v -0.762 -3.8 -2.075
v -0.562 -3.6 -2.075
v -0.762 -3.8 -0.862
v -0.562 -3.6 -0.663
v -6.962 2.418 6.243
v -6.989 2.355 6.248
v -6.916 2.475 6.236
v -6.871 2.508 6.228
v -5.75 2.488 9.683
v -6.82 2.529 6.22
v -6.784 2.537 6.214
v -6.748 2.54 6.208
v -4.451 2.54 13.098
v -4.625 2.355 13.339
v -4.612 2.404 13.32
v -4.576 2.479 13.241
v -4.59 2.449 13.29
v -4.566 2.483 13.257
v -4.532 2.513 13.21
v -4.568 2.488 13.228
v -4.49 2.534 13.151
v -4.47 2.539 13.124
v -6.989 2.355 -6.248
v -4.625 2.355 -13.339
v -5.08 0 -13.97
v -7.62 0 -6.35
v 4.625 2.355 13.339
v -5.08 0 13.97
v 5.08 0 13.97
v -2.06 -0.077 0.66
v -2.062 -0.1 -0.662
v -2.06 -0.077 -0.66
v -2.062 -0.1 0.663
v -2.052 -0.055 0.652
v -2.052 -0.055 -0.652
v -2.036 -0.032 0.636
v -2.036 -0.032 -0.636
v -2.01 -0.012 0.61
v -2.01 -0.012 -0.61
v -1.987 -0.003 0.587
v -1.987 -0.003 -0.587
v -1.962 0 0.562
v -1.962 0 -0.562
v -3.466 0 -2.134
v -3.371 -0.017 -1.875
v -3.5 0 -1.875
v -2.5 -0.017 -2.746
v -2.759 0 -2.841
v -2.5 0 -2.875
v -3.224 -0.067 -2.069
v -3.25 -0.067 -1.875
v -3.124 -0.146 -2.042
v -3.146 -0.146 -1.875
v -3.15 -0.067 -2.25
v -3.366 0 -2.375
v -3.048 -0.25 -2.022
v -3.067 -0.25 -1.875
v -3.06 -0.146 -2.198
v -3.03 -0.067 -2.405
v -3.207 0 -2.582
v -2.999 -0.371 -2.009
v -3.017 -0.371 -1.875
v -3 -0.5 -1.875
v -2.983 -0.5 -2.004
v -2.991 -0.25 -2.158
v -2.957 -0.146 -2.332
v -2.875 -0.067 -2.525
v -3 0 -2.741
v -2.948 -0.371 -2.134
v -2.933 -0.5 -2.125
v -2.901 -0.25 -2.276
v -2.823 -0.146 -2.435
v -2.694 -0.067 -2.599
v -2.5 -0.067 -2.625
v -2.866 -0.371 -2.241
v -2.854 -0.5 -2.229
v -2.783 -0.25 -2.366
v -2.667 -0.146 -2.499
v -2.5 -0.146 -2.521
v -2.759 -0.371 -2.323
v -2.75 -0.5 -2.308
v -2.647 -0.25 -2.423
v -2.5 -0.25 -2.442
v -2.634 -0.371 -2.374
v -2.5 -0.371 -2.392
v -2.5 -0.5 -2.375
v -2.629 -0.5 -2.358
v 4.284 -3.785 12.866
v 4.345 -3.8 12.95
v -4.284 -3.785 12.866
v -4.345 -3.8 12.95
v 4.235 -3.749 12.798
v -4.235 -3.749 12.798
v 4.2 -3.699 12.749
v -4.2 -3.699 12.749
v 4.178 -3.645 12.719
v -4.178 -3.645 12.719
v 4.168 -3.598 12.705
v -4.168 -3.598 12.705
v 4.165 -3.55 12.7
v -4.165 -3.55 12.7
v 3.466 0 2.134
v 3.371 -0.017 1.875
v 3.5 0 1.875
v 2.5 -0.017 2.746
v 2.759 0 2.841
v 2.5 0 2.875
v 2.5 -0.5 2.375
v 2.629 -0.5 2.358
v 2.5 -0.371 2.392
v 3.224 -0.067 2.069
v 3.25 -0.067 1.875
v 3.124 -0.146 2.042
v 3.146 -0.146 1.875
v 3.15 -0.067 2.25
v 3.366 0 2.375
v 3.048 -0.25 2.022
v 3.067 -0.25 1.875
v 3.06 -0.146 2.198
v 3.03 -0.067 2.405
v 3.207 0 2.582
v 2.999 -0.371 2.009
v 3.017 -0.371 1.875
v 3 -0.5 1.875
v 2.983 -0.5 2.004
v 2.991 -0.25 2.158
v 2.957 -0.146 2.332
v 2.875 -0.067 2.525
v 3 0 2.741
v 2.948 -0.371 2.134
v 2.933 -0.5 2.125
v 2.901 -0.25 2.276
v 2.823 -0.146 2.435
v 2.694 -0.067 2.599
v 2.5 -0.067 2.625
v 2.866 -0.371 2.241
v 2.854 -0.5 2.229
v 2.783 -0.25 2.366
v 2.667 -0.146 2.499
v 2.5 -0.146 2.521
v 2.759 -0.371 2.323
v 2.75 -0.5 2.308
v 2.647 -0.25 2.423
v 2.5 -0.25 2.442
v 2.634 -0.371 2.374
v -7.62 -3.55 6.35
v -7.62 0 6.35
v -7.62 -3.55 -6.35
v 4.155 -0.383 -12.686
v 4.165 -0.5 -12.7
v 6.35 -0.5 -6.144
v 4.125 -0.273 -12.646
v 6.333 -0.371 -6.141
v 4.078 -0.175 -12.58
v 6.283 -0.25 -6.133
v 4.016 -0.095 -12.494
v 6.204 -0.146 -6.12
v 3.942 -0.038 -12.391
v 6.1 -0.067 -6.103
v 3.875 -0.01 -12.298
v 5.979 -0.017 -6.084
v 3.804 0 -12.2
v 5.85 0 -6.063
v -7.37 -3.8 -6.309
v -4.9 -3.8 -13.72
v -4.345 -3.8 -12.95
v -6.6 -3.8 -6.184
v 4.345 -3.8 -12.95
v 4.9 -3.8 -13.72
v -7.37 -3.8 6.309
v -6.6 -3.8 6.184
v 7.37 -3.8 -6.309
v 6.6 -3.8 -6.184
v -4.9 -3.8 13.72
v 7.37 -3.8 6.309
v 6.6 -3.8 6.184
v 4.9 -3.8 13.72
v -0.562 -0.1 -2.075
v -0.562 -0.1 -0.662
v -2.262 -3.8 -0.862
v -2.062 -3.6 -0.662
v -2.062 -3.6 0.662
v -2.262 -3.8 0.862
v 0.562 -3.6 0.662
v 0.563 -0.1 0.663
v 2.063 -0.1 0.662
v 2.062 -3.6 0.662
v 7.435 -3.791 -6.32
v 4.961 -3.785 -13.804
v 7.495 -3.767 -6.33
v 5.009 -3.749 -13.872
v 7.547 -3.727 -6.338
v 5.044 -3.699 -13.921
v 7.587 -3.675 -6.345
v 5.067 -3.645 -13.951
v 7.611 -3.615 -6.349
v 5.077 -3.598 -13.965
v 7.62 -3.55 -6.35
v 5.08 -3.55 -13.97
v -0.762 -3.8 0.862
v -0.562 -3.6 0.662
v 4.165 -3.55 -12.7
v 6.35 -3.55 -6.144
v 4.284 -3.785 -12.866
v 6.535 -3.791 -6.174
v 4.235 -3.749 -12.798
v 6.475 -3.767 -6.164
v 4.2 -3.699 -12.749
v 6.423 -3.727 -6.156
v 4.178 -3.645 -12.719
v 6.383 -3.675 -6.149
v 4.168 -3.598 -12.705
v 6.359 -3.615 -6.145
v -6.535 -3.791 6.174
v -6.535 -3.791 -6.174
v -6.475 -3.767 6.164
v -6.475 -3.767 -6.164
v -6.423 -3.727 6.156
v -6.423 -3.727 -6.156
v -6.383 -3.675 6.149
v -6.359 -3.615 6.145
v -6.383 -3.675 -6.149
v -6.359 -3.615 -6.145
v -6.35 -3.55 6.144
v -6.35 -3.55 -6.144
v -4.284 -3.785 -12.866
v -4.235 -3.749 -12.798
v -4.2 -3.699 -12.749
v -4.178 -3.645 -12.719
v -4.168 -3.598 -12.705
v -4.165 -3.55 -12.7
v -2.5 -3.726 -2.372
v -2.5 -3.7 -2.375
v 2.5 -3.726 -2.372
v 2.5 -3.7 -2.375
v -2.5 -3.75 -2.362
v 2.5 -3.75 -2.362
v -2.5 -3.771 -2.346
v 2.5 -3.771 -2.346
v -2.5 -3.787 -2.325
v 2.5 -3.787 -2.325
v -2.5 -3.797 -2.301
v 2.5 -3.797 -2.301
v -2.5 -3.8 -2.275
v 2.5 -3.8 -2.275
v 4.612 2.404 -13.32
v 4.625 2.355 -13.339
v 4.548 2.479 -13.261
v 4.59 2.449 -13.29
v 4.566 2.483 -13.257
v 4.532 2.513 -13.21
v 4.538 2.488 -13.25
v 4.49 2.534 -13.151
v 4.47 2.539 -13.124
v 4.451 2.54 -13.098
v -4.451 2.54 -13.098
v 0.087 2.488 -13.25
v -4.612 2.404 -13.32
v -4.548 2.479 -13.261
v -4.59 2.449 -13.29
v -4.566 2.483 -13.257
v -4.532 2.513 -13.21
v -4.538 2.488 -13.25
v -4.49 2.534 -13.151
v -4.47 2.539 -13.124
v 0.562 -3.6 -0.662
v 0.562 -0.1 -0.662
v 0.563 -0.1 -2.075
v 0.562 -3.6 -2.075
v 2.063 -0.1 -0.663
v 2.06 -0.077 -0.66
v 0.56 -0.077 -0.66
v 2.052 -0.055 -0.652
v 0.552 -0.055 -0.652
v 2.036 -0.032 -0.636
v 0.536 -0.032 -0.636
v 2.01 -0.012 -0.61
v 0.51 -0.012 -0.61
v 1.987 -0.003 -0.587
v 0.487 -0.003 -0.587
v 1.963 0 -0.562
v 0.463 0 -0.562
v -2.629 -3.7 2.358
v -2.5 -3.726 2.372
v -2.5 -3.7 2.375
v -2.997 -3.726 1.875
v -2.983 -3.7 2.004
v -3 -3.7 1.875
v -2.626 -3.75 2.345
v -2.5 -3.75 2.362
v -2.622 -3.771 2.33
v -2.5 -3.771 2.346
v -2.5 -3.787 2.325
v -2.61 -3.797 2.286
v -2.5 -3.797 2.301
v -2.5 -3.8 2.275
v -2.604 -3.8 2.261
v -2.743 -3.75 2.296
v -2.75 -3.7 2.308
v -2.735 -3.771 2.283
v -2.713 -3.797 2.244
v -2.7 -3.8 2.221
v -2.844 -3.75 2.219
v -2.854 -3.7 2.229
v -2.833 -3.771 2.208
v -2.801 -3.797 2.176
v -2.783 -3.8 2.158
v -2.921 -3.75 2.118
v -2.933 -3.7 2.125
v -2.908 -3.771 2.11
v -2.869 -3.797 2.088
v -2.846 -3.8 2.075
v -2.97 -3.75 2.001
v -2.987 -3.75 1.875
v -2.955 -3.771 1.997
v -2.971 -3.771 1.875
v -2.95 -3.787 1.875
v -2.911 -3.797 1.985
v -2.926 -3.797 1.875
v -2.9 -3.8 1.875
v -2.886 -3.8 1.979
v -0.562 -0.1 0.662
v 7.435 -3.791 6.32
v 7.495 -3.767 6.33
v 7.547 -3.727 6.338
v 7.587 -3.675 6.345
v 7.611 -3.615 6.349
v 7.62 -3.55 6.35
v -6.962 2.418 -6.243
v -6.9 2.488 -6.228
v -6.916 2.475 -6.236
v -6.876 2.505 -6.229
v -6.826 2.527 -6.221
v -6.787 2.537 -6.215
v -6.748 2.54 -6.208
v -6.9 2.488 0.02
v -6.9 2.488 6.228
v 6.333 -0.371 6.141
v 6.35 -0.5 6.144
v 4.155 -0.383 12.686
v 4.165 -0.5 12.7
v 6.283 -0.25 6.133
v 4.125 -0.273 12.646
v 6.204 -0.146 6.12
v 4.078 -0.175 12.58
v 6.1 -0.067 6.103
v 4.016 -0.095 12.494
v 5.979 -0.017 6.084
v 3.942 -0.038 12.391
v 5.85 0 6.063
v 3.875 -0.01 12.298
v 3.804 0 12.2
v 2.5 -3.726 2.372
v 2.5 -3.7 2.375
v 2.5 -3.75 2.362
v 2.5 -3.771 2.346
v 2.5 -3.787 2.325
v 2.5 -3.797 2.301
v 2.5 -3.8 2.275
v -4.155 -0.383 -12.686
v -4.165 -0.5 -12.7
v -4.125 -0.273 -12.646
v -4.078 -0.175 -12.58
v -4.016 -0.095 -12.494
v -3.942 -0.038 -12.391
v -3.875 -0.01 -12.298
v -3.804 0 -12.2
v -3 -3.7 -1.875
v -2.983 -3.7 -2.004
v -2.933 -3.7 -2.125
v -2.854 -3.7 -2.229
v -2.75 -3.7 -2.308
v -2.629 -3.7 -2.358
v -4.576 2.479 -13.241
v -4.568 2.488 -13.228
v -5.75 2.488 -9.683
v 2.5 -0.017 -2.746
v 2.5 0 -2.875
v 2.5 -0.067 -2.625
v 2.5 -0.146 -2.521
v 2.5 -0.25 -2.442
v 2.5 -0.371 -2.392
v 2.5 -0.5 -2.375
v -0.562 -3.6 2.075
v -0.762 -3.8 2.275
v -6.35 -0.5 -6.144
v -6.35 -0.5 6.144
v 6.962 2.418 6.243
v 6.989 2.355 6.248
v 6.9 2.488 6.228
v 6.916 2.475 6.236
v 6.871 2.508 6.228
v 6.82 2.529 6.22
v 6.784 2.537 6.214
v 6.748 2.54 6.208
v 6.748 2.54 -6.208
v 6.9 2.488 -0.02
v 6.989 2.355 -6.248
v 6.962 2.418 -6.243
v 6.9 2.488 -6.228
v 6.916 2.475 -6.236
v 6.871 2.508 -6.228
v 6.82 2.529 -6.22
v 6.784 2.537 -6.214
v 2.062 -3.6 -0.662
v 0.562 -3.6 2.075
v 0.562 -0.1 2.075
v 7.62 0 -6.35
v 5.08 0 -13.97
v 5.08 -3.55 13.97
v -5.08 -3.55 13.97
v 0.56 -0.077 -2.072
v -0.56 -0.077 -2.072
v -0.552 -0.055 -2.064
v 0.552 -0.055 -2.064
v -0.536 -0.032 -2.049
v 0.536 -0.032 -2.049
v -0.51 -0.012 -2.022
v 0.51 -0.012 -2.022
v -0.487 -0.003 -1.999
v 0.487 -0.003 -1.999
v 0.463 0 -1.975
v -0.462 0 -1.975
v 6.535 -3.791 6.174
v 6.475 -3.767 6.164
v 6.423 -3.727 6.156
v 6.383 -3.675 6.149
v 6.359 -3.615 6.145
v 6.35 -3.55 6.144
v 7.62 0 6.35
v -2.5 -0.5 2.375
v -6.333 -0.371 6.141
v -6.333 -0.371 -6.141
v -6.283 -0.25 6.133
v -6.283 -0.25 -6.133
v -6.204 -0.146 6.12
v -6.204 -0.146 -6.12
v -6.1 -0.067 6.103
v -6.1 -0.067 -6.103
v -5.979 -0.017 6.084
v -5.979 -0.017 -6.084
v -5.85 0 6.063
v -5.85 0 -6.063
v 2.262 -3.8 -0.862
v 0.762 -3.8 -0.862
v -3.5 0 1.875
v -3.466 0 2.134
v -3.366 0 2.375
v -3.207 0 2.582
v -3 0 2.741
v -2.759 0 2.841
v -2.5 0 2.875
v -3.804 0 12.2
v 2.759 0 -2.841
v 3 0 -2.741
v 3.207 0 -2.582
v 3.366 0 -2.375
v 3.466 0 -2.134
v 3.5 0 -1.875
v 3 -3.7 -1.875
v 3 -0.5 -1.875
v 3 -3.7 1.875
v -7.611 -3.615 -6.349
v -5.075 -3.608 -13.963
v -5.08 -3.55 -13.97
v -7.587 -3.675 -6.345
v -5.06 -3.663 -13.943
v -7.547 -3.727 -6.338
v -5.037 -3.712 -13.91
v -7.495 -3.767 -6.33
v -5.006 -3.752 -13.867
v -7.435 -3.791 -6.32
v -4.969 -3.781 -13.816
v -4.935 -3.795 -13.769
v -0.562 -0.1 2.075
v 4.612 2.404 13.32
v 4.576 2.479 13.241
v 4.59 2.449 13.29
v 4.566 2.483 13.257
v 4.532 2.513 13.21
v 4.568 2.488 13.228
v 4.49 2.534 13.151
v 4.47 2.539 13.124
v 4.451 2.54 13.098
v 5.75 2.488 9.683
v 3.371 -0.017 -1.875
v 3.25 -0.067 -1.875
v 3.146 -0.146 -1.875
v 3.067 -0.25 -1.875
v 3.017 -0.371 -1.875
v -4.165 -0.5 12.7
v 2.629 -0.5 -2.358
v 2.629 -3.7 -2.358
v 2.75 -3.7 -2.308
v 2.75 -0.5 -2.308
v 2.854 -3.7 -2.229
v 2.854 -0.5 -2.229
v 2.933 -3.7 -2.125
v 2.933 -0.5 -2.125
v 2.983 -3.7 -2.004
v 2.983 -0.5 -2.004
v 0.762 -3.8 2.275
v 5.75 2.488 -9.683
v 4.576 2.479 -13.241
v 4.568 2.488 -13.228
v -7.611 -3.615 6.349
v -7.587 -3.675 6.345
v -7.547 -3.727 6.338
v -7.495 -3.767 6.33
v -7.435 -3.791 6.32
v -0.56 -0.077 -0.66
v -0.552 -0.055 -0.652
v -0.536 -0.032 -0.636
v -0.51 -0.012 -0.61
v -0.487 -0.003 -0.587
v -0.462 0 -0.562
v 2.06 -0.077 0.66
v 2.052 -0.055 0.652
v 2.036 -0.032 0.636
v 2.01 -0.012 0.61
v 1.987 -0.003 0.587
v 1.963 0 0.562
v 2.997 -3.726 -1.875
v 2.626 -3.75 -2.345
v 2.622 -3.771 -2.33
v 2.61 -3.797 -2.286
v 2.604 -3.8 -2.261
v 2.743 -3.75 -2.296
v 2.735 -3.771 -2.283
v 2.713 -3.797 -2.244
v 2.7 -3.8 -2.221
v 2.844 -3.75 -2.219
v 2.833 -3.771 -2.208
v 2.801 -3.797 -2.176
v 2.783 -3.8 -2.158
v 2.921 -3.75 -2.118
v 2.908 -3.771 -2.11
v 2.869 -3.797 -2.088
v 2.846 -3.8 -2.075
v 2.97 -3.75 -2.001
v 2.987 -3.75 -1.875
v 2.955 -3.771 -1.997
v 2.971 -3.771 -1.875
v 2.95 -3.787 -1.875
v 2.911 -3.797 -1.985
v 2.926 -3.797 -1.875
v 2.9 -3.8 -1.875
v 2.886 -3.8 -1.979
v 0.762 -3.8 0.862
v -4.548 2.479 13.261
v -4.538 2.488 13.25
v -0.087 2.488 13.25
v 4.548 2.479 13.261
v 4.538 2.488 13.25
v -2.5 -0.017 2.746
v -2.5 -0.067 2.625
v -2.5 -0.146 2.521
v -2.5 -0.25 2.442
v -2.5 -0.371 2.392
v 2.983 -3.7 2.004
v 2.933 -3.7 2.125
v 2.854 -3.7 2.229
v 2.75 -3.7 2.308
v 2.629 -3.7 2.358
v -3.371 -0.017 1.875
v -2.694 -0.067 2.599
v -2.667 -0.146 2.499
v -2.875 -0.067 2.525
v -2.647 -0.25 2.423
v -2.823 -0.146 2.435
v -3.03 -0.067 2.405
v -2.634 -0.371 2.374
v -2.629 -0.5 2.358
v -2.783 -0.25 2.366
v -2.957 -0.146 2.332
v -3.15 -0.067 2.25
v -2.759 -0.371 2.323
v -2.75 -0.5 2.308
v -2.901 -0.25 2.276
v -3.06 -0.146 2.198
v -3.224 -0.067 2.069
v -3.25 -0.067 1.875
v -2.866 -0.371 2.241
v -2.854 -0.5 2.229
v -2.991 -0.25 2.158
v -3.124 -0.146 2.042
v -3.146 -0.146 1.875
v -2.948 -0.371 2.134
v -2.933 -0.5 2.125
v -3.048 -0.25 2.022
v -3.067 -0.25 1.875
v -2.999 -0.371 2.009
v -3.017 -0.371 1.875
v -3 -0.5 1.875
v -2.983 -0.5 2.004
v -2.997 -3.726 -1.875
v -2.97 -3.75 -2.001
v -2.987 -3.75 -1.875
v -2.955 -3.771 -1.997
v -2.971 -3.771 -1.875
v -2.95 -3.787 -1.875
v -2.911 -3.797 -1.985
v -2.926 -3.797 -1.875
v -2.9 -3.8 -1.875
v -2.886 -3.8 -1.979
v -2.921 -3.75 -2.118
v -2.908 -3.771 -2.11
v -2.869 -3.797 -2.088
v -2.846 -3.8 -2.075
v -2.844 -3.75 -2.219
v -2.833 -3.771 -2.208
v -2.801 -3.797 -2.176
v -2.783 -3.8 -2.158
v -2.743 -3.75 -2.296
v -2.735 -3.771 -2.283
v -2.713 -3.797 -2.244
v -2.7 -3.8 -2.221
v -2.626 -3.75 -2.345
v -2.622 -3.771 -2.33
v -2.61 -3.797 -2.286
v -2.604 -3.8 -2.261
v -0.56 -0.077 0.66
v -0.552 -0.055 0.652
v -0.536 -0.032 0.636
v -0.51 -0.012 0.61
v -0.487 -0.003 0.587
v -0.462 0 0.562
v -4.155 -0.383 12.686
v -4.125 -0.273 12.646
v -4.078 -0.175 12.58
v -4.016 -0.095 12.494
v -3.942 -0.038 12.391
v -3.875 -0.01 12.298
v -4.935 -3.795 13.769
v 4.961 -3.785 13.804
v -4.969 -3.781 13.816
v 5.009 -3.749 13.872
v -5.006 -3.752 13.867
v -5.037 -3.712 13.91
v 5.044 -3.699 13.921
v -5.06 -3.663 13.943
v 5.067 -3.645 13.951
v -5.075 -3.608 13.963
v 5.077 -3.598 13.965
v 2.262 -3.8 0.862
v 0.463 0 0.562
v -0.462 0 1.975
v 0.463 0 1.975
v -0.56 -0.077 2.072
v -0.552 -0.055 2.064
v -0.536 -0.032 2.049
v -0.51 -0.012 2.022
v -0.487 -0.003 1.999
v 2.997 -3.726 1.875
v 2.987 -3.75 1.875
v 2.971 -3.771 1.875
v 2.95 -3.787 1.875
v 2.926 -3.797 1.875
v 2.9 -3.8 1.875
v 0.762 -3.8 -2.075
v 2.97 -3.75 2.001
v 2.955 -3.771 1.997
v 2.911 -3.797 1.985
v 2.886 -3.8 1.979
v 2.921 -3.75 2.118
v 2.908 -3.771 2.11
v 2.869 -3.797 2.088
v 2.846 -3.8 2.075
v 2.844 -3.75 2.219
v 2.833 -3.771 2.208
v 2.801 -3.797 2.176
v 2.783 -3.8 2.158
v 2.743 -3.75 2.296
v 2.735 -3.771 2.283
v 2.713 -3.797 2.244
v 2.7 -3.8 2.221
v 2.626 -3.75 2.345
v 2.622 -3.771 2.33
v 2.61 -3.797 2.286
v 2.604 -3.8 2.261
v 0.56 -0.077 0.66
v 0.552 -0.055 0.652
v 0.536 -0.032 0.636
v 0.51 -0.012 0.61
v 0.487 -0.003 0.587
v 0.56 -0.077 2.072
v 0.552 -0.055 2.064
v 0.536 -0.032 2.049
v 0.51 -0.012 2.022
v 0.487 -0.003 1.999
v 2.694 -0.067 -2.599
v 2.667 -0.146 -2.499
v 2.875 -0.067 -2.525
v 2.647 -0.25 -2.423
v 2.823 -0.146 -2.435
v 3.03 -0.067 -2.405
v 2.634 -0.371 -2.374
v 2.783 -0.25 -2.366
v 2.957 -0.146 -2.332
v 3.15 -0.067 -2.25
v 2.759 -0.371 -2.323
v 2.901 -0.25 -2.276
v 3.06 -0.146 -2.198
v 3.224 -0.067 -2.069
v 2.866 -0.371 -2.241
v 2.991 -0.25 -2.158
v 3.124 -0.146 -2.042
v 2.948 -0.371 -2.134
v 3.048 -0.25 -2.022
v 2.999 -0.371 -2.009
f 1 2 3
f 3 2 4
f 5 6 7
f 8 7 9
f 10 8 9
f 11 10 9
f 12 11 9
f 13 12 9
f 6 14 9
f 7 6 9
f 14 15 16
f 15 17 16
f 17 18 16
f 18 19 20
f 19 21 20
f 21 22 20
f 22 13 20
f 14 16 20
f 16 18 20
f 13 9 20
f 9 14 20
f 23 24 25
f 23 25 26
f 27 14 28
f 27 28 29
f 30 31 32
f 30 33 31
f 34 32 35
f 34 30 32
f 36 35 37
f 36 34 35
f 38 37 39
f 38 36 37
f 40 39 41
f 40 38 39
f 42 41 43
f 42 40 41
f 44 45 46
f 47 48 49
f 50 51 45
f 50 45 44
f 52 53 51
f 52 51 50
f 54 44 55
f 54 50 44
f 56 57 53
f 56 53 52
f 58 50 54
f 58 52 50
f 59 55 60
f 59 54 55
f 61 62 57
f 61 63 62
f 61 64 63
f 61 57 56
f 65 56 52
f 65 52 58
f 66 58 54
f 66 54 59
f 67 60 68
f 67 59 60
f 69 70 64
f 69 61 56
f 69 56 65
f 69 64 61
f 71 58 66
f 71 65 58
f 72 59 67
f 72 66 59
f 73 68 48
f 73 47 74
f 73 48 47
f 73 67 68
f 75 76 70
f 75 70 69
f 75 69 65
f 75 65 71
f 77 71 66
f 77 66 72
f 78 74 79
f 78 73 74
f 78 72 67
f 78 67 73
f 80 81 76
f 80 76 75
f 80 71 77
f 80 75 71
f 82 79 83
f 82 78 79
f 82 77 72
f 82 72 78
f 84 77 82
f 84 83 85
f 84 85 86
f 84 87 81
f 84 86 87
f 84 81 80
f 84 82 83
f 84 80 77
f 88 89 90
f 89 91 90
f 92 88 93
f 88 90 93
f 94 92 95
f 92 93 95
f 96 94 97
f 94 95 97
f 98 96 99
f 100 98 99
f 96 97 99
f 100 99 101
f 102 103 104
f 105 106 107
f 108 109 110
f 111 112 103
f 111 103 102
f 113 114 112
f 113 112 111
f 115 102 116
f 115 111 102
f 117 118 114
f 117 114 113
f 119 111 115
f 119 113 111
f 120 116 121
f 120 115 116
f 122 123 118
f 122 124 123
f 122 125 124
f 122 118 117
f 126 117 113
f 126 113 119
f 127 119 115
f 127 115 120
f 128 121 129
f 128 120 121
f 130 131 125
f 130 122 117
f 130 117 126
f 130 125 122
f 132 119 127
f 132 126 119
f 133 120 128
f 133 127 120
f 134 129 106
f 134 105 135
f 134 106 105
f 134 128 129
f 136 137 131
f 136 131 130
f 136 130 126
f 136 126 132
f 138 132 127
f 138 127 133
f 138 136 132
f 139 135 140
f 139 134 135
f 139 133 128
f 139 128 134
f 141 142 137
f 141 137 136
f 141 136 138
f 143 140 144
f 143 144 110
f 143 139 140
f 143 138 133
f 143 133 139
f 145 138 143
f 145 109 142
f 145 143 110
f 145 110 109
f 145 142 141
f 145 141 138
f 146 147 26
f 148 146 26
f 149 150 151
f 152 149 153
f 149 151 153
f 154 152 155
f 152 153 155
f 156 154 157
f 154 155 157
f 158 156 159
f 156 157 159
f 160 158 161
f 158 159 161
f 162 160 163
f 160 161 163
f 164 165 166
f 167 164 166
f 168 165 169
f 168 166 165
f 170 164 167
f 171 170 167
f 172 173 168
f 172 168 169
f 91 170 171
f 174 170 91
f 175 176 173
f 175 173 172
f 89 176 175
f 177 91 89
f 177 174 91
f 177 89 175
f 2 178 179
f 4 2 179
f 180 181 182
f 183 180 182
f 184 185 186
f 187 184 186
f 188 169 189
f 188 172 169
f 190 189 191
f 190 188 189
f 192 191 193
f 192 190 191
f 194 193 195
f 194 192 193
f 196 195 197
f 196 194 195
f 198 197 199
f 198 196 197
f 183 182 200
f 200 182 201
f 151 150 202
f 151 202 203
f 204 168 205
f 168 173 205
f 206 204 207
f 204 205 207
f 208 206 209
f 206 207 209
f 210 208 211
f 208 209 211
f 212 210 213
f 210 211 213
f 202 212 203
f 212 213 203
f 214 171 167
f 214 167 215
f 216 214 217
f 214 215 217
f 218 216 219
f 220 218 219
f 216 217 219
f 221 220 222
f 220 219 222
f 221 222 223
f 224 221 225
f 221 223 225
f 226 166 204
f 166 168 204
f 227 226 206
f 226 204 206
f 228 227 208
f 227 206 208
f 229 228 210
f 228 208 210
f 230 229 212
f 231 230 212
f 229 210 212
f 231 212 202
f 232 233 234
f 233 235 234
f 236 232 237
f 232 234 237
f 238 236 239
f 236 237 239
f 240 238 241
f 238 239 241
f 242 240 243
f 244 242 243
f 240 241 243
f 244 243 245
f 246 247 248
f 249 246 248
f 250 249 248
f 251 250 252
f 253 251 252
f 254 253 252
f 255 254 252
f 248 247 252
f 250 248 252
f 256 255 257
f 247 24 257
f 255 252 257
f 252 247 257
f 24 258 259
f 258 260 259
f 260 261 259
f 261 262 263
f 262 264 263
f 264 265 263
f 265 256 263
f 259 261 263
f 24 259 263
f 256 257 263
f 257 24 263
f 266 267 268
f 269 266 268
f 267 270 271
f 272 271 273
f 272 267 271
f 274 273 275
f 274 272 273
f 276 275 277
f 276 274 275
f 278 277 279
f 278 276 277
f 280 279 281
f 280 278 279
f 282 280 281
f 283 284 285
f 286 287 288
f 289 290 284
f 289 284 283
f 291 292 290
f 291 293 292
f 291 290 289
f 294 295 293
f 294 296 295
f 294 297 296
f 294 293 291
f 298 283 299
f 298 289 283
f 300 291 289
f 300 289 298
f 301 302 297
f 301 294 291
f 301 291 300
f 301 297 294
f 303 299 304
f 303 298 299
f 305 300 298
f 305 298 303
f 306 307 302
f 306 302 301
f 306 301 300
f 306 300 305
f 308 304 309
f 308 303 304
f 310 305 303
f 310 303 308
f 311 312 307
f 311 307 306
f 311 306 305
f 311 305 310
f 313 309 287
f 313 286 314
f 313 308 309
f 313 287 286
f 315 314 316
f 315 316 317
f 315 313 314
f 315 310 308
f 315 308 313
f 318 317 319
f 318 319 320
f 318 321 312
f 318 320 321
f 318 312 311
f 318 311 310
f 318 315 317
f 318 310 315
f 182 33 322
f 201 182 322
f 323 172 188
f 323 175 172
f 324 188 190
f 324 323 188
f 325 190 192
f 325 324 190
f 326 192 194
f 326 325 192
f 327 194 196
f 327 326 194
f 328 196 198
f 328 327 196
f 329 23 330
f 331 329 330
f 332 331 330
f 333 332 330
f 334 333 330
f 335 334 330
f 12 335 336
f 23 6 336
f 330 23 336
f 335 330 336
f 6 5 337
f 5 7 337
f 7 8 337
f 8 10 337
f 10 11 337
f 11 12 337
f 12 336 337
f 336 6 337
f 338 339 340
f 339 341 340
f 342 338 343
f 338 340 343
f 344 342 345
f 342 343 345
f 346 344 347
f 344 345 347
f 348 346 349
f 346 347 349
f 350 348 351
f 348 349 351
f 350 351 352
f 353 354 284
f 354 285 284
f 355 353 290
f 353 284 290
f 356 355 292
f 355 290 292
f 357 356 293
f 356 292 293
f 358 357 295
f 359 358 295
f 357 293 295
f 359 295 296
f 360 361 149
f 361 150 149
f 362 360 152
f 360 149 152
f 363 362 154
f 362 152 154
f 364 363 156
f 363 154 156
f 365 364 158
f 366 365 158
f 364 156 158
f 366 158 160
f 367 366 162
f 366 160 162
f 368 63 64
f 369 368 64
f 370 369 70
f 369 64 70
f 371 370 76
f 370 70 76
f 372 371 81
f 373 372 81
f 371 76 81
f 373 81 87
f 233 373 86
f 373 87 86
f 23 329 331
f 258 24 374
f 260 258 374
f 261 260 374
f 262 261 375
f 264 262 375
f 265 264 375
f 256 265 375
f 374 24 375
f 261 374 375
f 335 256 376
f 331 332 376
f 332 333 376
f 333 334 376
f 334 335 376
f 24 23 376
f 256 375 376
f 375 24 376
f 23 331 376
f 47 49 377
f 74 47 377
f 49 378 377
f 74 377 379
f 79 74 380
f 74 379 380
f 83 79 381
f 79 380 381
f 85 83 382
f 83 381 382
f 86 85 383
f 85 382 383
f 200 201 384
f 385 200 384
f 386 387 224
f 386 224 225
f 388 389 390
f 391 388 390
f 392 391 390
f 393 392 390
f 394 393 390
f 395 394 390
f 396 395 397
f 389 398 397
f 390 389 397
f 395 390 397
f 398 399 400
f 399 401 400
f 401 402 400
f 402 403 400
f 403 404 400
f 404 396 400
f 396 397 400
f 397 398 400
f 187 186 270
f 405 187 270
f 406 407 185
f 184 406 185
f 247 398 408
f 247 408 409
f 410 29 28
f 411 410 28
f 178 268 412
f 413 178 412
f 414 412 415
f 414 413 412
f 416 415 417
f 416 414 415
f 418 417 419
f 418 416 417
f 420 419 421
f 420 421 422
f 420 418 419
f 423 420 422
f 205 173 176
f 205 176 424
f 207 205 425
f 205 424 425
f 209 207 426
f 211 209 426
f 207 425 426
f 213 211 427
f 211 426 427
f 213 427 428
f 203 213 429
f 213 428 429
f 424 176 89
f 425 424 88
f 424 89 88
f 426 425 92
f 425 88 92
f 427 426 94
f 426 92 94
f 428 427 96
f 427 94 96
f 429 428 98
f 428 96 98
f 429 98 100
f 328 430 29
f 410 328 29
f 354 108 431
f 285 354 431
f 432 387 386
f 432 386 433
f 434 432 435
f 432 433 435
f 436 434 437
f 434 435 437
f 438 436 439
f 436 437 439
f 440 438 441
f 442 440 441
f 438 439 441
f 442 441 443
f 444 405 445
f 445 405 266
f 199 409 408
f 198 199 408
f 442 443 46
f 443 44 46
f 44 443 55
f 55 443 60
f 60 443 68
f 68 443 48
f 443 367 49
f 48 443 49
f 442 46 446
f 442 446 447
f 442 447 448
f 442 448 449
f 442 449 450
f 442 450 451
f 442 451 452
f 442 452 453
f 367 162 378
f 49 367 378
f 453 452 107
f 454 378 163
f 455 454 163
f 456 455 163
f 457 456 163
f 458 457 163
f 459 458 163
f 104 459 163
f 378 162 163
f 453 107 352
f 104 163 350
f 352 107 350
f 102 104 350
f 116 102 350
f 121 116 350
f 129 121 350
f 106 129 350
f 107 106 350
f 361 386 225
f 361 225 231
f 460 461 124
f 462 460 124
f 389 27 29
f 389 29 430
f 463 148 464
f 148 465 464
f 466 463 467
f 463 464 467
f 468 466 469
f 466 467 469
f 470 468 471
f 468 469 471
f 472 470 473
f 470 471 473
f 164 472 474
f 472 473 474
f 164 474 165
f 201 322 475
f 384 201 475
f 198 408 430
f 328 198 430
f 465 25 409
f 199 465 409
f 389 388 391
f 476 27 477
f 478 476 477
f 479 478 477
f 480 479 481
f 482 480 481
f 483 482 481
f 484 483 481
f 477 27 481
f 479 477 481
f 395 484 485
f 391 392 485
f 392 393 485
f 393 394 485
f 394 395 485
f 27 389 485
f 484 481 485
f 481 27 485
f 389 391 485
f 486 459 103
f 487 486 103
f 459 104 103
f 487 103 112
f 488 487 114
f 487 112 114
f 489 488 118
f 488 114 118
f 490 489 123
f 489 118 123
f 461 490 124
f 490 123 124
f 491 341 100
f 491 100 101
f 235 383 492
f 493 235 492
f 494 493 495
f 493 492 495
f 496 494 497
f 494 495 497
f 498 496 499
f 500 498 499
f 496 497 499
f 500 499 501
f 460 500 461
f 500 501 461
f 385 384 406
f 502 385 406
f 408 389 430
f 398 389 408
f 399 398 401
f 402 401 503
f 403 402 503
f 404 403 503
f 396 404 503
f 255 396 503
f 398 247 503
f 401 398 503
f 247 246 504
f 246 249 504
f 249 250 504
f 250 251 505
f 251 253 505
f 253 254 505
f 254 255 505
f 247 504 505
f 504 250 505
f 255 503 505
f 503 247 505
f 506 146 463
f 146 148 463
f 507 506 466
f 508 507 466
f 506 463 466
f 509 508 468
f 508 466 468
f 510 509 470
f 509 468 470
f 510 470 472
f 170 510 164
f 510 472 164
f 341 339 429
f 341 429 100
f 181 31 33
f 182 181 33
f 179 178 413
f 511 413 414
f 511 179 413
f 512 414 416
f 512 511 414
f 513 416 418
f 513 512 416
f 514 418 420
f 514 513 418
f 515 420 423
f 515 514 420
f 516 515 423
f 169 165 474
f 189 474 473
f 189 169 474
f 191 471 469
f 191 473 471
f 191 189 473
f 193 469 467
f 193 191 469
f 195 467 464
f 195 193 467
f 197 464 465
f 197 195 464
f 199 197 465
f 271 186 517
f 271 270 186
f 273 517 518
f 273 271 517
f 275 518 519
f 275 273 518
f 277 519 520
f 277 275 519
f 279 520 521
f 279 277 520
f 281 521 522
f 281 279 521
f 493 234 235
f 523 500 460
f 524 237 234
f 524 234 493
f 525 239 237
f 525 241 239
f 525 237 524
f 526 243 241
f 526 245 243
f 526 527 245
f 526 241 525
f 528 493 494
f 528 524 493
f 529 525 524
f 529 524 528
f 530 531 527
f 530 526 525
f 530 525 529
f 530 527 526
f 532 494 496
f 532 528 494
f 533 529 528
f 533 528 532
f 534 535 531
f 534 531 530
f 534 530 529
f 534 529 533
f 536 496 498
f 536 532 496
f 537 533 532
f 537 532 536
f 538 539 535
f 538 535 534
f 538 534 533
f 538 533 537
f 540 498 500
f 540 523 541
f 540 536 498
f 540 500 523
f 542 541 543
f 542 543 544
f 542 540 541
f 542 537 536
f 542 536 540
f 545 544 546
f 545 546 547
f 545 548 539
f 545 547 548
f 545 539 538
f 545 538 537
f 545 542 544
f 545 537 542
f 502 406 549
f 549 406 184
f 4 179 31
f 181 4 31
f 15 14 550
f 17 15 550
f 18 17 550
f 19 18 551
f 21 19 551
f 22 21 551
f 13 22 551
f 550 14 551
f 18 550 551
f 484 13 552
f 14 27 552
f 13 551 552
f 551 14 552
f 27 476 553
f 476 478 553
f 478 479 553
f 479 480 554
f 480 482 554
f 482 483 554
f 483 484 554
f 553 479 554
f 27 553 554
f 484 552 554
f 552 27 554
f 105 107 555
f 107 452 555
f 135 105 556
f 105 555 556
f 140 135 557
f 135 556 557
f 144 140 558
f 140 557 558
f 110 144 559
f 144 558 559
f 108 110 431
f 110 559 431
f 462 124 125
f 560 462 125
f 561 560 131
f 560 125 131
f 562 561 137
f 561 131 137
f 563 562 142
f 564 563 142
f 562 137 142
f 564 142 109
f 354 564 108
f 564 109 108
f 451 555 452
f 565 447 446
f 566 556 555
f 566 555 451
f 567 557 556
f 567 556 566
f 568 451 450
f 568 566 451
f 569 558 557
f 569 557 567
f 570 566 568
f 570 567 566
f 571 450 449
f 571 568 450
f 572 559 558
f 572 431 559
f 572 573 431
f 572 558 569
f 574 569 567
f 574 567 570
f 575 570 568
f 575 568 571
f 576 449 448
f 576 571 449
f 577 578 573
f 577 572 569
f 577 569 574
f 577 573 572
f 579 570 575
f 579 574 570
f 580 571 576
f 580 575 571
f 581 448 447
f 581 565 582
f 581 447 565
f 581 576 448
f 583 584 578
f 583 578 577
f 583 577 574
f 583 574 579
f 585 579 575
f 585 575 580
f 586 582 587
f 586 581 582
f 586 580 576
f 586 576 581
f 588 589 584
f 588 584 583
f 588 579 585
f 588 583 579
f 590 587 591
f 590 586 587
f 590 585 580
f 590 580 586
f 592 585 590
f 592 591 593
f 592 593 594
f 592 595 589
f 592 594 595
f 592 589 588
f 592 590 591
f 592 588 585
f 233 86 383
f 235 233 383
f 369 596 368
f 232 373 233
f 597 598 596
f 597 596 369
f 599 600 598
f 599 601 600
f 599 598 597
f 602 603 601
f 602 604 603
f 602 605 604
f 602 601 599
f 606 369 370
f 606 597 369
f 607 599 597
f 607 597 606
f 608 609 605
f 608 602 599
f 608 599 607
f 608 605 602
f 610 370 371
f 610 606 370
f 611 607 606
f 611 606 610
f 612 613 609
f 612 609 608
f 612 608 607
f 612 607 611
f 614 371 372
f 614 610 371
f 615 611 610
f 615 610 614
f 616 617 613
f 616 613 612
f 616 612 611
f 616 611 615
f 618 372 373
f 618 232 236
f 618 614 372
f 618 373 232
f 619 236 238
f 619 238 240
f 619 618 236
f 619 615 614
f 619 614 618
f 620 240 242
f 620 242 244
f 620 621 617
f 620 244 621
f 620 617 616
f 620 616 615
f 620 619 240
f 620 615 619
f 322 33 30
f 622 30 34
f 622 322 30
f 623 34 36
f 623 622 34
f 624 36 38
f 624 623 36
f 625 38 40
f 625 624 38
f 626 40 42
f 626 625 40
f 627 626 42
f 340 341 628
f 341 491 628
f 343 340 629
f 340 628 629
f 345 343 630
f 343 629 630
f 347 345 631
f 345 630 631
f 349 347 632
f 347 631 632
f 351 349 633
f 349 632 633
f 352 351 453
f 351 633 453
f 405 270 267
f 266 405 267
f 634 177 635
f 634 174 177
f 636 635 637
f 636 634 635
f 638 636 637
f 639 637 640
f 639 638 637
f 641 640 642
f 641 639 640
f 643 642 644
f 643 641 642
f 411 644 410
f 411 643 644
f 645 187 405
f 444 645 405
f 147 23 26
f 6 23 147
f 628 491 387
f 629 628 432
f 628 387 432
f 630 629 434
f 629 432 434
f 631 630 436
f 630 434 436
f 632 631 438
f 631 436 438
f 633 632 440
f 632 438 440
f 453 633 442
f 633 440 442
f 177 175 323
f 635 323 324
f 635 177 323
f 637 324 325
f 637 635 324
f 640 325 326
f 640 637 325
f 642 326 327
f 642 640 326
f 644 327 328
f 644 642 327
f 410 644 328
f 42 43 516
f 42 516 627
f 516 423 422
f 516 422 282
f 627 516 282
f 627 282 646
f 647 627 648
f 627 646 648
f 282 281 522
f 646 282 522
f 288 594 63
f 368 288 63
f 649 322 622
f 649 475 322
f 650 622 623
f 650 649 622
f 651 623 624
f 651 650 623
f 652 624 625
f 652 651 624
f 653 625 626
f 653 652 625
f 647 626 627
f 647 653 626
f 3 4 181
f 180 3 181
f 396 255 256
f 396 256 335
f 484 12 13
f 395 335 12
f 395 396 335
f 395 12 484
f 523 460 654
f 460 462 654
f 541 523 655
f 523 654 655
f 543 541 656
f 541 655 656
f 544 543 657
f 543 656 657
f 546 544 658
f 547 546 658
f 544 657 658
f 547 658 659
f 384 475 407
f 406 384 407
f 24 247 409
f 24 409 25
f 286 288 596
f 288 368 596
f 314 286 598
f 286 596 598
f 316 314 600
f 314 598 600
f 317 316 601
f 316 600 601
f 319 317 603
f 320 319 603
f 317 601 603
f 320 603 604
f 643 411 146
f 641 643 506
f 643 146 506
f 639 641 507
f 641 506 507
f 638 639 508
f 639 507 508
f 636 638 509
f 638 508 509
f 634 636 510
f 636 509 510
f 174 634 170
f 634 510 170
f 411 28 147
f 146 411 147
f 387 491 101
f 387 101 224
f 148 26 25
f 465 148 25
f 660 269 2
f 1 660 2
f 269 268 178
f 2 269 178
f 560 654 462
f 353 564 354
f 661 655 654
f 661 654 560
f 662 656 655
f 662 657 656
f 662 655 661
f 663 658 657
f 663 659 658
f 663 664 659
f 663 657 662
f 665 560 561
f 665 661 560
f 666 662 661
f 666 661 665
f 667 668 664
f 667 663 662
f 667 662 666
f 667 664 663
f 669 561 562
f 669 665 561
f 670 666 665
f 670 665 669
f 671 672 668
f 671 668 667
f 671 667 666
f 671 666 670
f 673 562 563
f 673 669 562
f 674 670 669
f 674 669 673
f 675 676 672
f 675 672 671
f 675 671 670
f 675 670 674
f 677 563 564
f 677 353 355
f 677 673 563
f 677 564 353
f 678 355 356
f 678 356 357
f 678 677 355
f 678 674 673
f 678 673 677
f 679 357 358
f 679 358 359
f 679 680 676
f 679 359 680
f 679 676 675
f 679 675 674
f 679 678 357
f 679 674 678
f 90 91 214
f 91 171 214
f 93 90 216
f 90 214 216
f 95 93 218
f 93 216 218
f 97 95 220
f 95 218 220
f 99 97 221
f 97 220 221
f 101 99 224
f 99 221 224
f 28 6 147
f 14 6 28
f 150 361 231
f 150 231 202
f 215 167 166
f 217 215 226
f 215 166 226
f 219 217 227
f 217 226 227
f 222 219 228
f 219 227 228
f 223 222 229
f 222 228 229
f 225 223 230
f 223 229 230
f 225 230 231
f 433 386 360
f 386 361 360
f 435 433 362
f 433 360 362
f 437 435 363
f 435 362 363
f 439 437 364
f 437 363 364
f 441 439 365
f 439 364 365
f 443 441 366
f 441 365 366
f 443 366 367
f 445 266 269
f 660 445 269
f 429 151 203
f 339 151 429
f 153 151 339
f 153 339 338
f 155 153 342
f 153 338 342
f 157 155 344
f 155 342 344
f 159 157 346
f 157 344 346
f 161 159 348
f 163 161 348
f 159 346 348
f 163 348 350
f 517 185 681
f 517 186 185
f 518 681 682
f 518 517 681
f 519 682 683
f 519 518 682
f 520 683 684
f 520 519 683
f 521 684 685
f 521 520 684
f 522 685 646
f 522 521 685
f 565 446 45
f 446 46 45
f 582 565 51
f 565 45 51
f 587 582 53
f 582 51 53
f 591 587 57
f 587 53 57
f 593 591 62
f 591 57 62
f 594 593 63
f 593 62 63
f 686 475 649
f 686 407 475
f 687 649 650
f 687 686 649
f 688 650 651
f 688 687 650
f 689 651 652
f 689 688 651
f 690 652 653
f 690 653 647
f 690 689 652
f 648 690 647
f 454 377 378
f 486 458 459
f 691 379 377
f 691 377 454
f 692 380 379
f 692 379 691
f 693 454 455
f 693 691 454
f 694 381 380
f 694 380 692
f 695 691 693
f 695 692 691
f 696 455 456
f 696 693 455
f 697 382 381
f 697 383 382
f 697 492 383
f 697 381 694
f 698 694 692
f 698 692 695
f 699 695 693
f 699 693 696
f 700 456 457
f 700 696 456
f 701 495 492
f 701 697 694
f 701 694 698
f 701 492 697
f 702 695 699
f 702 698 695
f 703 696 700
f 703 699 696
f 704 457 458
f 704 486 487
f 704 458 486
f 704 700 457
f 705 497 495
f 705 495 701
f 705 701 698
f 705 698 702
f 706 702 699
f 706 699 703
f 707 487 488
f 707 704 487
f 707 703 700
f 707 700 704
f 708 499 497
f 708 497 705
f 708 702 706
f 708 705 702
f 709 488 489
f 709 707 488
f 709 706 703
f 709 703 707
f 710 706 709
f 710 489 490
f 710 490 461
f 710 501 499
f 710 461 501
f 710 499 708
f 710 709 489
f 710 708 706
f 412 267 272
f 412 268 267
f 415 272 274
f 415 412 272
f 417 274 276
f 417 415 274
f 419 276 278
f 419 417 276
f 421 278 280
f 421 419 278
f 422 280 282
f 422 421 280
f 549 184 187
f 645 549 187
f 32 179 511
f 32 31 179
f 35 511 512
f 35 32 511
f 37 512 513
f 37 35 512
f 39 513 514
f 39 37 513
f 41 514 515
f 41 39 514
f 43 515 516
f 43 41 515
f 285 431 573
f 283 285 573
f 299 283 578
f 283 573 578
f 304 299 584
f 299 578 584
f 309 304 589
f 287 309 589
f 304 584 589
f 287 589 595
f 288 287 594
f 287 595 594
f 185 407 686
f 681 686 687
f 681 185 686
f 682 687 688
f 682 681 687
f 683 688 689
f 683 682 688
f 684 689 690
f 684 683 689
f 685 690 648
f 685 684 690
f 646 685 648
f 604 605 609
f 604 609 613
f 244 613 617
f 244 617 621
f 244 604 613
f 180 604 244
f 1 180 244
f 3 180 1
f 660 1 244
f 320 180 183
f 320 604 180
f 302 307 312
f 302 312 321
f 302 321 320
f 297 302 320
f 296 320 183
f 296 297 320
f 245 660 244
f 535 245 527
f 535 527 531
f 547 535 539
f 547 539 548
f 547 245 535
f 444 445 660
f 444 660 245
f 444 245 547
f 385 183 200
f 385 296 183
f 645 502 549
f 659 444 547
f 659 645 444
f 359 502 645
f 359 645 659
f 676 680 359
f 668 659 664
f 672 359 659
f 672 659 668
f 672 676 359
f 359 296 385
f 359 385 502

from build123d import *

# Parameters (mm, degrees)
BOSS_EXTRUDE1_DEPTH = 2.54
BOSS_EXTRUDE1_TAPER = 15
BOSS_EXTRUDE2_DEPTH = 3.8
FILLET2_R           = 0.1
CHAMFER1_SIZE       = 0.2
BOSS_EXTRUDE3_DEPTH = 3.8
FILLET3_R           = 0.25
FILLET5_R           = 0.5
FILLET6_R           = 0.1
FILLET7_R           = 0.25


with BuildPart() as part:
    # Sketch1 → Boss-Extrude1 (new body)
    with BuildSketch(Plane(origin=(0, 0, 0), x_dir=(1, 0, 0), z_dir=(0, 1, 0))):
        Polygon((-7.62, 6.35), (-7.62, -6.35), (-5.08, -13.97), (5.08, -13.97), (7.62, -6.35), (7.62, 6.35), (5.08, 13.97), (-5.08, 13.97), align=None)
    extrude(amount=BOSS_EXTRUDE1_DEPTH, taper=BOSS_EXTRUDE1_TAPER)

    # Stem → Boss-Extrude2 (add)
    with BuildSketch(Plane.XZ):
        with BuildLine():
            Line((2.499999969, 2.374999949), (-2.499999969, 2.374999949))
            ThreePointArc((-2.499999969, 2.374999949), (-2.85355336, 2.22855334), (-2.999999969, 1.874999949))
            Line((-2.999999969, 1.874999949), (-2.999999969, -1.874999949))
            ThreePointArc((-2.999999969, -1.874999949), (-2.85355336, -2.22855334), (-2.499999969, -2.374999949))
            Line((-2.499999969, -2.374999949), (2.499999969, -2.374999949))
            ThreePointArc((2.499999969, -2.374999949), (2.85355336, -2.22855334), (2.999999969, -1.874999949))
            Line((2.999999969, -1.874999949), (2.999999969, 1.874999949))
            ThreePointArc((2.999999969, 1.874999949), (2.85355336, 2.22855334), (2.499999969, 2.374999949))
        make_face()
        Polygon((-0.5625, 0.6625), (-0.5625, 2.075), (0.5625, 2.075), (0.5625, 0.6625), (2.0625, 0.6625), (2.0625, -0.6625), (0.5625, -0.6625), (0.5625, -2.075), (-0.5625, -2.075), (-0.5625, -0.6625), (-2.0625, -0.6625), (-2.0625, 0.6625), align=None, mode=Mode.SUBTRACT)
    extrude(amount=BOSS_EXTRUDE2_DEPTH)

    # Fillet2
    fillet2_edges = [part.edges().sort_by_distance(p)[0] for p in [
        (2.85355336, -3.8, 2.22855334),
        (0, -3.8, 2.374999949),
        (2.999999969, -3.8, 0),
        (-2.85355336, -3.8, 2.22855334),
        (-2.999999969, -3.8, 0),
        (-2.85355336, -3.8, -2.22855334),
        (0, -3.8, -2.374999949),
        (2.85355336, -3.8, -2.22855334),
    ]]
    fillet(fillet2_edges, radius=FILLET2_R)

    # Chamfer1
    chamfer1_edges = [part.edges().sort_by_distance(p)[0] for p in [
        (-2.0625, -3.8, 0),
        (-1.3125, -3.8, 0.6625),
        (-0.5625, -3.8, 1.36875),
        (1.3125, -3.8, 0.6625),
        (-0.5625, -3.8, -1.36875),
        (0, -3.8, 2.075),
        (0.5625, -3.8, 1.36875),
        (2.0625, -3.8, 0),
        (1.3125, -3.8, -0.6625),
        (0.5625, -3.8, -1.36875),
        (-1.3125, -3.8, -0.6625),
    ]]
    chamfer(chamfer1_edges, length=CHAMFER1_SIZE - 0.0001)  # a hair under: the kernel refuses the full size

    # Sketch3 → Boss-Extrude3 (add)
    with BuildSketch(Plane.XZ):
        Polygon((-7.62, 6.35), (-7.62, -6.35), (-5.08, -13.97), (5.08, -13.97), (7.62, -6.35), (7.62, 6.35), (5.08, 13.97), (-5.08, 13.97), align=None)
        Polygon((-6.35, -6.143907372), (-4.164635791, -12.7), (4.164635791, -12.7), (6.35, -6.143907372), (6.35, 6.143907372), (4.164635791, 12.7), (-4.164635791, 12.7), (-6.35, 6.143907372), align=None, mode=Mode.SUBTRACT)
    extrude(amount=BOSS_EXTRUDE3_DEPTH)

    # Fillet3
    fillet3_edges = [part.edges().sort_by_distance(p)[0] for p in [
        (-6.35, -3.8, 10.16),
        (-7.62, -3.8, 0),
        (-6.35, -3.8, -10.16),
        (0, -3.8, -13.97),
        (6.35, -3.8, -10.16),
        (7.62, -3.8, 0),
        (6.35, -3.8, 10.16),
        (0, -3.8, 13.97),
        (-6.35, -3.8, 0),
        (-5.257317895, -3.8, -9.421953686),
        (0, -3.8, -12.7),
        (5.257317895, -3.8, -9.421953686),
        (6.35, -3.8, 0),
        (5.257317895, -3.8, 9.421953686),
        (0, -3.8, 12.7),
        (-5.257317895, -3.8, 9.421953686),
    ]]
    fillet(fillet3_edges, radius=FILLET3_R)

    # Fillet5
    fillet5_edges = [part.edges().sort_by_distance(p)[0] for p in [
        (-6.35, 0, 0),
        (-5.257317895, 0, -9.421953686),
        (0, 0, -12.7),
        (5.257317895, 0, -9.421953686),
        (6.35, 0, 0),
        (5.257317895, 0, 9.421953686),
        (0, 0, 12.7),
        (-5.257317895, 0, 9.421953686),
        (-2.85355336, 0, 2.22855334),
        (-2.999999969, 0, 0),
        (-2.85355336, 0, -2.22855334),
        (0, 0, -2.374999949),
        (2.85355336, 0, -2.22855334),
        (2.85355336, 0, 2.22855334),
        (2.999999969, 0, 0),
        (0, 0, 2.374999949),
    ]]
    fillet(fillet5_edges, radius=FILLET5_R)

    # Fillet6
    fillet6_edges = [part.edges().sort_by_distance(p)[0] for p in [
        (0, 0, 2.075),
        (0.5625, 0, 1.36875),
        (2.0625, 0, 0),
        (1.3125, 0, -0.6625),
        (0.5625, 0, -1.36875),
        (-1.3125, 0, -0.6625),
        (-2.0625, 0, 0),
        (-0.5625, 0, -1.36875),
        (0, 0, -2.075),
        (1.3125, 0, 0.6625),
        (-0.5625, 0, 1.36875),
        (-1.3125, 0, 0.6625),
    ]]
    fillet(fillet6_edges, radius=FILLET6_R)

    # Fillet7
    fillet7_edges = [part.edges().sort_by_distance(p)[0] for p in [
        (-6.939409051, 2.54, 0),
        (-5.764433425, 2.54, 9.764482172),
        (0, 2.54, 13.289409051),
        (5.764433425, 2.54, 9.764482172),
        (6.939409051, 2.54, 0),
        (5.764433425, 2.54, -9.764482172),
        (0, 2.54, -13.289409051),
        (-5.764433425, 2.54, -9.764482172),
    ]]
    fillet(fillet7_edges, radius=FILLET7_R)


solid = part.part
